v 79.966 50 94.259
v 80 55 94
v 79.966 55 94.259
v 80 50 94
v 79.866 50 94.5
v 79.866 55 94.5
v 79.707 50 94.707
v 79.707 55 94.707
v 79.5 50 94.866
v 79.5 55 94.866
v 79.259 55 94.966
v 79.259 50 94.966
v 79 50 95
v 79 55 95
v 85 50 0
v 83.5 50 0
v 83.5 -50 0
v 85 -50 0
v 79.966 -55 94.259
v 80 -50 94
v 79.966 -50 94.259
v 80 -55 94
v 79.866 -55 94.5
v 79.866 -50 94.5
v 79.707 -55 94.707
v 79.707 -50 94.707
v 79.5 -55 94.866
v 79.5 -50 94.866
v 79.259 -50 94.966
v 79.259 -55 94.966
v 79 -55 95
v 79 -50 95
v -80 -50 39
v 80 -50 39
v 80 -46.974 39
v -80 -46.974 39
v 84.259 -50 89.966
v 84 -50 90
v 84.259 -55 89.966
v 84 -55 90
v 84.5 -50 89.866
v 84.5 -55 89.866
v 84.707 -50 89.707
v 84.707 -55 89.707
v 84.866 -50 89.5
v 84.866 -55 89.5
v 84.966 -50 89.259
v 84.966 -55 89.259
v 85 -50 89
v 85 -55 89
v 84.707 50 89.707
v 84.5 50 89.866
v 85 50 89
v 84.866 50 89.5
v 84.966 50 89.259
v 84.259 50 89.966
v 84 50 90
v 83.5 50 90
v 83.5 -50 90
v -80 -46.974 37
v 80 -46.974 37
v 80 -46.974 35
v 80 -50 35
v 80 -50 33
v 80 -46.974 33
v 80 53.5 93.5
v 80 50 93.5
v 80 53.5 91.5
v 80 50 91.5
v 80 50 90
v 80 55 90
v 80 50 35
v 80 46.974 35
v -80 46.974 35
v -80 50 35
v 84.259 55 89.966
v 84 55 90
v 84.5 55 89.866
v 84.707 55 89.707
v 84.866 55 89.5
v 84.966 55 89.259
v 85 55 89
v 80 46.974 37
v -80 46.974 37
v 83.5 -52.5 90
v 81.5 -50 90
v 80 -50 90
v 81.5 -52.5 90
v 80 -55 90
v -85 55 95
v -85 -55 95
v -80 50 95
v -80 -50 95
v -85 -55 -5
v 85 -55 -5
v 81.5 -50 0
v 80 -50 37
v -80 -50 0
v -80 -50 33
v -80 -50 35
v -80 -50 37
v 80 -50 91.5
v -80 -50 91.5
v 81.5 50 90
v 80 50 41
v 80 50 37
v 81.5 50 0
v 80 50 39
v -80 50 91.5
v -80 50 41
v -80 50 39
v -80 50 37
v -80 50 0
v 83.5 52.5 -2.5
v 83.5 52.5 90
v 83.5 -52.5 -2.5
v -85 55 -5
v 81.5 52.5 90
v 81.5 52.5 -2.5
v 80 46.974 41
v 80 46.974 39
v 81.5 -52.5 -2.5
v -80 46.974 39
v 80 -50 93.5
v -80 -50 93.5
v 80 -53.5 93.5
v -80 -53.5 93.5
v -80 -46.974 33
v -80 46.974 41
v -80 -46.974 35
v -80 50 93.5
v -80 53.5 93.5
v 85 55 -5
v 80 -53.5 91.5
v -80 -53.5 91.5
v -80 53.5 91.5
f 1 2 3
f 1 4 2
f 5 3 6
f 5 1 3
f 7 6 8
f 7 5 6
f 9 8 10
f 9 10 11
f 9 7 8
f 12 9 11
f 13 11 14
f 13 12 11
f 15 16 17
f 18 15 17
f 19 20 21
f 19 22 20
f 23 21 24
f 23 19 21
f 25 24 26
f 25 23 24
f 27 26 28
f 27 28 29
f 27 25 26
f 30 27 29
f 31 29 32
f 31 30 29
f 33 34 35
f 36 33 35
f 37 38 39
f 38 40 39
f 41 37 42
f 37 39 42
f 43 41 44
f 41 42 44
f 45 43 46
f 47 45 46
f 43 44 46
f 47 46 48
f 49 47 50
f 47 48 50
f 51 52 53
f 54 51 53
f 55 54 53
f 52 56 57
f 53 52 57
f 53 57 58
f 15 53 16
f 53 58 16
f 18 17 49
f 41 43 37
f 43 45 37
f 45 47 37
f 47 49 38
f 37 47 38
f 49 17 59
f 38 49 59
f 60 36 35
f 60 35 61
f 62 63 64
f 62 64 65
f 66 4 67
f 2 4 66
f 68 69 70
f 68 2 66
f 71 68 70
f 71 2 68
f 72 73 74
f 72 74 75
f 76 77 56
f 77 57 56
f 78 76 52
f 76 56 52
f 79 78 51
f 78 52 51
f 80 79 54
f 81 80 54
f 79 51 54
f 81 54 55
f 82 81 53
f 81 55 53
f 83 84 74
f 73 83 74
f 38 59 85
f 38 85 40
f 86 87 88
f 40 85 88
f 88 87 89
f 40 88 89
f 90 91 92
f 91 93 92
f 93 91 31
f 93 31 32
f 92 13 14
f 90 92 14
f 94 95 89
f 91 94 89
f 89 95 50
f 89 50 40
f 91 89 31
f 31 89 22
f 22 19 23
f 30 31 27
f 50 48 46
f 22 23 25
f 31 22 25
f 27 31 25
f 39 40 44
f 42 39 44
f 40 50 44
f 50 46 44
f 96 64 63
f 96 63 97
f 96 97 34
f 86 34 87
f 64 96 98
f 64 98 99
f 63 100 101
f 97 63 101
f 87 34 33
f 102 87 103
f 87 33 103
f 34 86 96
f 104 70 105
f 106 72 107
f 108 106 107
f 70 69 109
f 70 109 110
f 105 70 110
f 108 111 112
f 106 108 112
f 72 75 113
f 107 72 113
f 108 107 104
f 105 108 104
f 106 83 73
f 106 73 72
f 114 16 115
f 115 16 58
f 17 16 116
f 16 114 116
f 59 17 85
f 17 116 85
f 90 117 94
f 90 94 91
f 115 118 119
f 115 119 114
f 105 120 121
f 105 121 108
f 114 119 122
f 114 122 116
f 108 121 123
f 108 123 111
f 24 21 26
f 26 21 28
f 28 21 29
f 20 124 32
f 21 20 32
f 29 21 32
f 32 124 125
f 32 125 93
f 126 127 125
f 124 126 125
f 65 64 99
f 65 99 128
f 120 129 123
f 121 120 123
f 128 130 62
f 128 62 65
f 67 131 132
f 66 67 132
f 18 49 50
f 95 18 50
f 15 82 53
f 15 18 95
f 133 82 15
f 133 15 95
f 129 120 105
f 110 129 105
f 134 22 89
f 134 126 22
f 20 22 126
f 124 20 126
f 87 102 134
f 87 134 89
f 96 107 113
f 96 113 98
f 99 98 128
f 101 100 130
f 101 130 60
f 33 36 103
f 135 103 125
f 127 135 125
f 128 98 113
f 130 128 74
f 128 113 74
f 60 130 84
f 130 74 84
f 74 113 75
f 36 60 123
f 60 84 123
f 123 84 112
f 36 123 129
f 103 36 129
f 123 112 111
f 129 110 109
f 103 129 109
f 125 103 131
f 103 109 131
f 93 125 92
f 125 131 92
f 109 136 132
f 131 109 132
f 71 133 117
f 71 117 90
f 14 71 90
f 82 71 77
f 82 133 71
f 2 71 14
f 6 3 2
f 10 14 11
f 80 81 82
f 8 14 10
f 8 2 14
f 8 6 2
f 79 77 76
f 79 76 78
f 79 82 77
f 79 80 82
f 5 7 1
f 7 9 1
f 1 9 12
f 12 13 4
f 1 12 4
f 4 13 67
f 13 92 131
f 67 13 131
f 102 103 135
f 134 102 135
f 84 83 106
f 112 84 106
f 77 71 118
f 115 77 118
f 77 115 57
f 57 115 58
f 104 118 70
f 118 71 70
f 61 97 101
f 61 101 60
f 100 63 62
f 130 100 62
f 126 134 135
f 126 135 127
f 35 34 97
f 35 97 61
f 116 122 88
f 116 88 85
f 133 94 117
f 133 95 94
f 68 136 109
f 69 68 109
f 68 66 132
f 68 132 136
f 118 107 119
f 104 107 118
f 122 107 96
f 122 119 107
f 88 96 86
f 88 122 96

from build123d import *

# Parameters (mm, degrees)
BOSS_EXTRUDE1_DEPTH   = 90
BOSS_EXTRUDE1_2_DEPTH = 90
SKETCH3_W             = 2
SKETCH3_H             = 3.026273801
EXTRUDE_THIN1_DEPTH   = 160
SKETCH5_W             = 160
SKETCH5_H             = 110
BOSS_EXTRUDE2_DEPTH   = 5
BOSS_EXTRUDE3_DEPTH   = 5
SKETCH7_W             = 2
SKETCH7_H             = 100
CUT_EXTRUDE1_DEPTH    = 2.5
SKETCH8_W             = 2
SKETCH8_H             = 90
CUT_EXTRUDE2_DEPTH    = 2.5
SKETCH9_W             = 2
SKETCH9_H             = 90
CUT_EXTRUDE3_DEPTH    = 2.5
SKETCH10_W            = 2
SKETCH10_H            = 2.5
CUT_EXTRUDE4_DEPTH    = 2.5
BOSS_EXTRUDE4_DEPTH   = 160
SKETCH12_W            = 100
SKETCH12_H            = 110
BOSS_EXTRUDE5_DEPTH   = 5
FILLET1_R             = 1


with BuildPart() as part:
    # Sketch2 → Boss-Extrude1 (new body)
    with BuildSketch(Plane.XY):
        Polygon((80, 55), (-80, 55), (-80, 50), (-75, 50), (75, 50), (80, 50), align=None)
    extrude(amount=BOSS_EXTRUDE1_DEPTH)



with BuildPart() as body_2:
    # Sketch2 → Boss-Extrude1 2 (new body)
    with BuildSketch(Plane.XY):
        Polygon((-75, -50), (-80, -50), (-80, -55), (80, -55), (80, -50), (75, -50), align=None)
    extrude(amount=BOSS_EXTRUDE1_2_DEPTH)


with BuildPart() as part_1:
    add(part.part)

    add(body_2.part)  # Extrude-Thin1 merges body 2
    # Sketch3 → Extrude-Thin1 (add)
    with BuildSketch(Plane(origin=(80, 0, 0), x_dir=(0, 0, -1), z_dir=(1, 0, 0))):
        with Locations((-36, 48.486863099)):
            Rectangle(SKETCH3_W, SKETCH3_H)
        with Locations((-34, -48.486863099)):
            Rectangle(SKETCH3_W, SKETCH3_H)
        with Locations((-40, 48.486863099)):
            Rectangle(SKETCH3_W, SKETCH3_H)
        with Locations((-38, -48.486863099)):
            Rectangle(SKETCH3_W, SKETCH3_H)
    extrude(amount=-EXTRUDE_THIN1_DEPTH)

    # Sketch5 → Boss-Extrude2 (add)
    with BuildSketch(Plane(origin=(0, 0, 0), x_dir=(-1, 0, 0), z_dir=(0, 0, -1))):
        Rectangle(SKETCH5_W, SKETCH5_H)
    extrude(amount=BOSS_EXTRUDE2_DEPTH)

    # Sketch6 → Boss-Extrude3 (add)
    with BuildSketch(Plane(origin=(80, 0, 0), x_dir=(0, 0, -1), z_dir=(1, 0, 0))):
        Polygon((-90, 55), (-90, 50), (0, 50), (0, -50), (-90, -50), (-90, -55), (5, -55), (5, 55), align=None)
    extrude(amount=BOSS_EXTRUDE3_DEPTH)

    # Sketch7 → Cut-Extrude1 (cut)
    with BuildSketch(Plane.XY):
        with Locations((82.5, 0)):
            Rectangle(SKETCH7_W, SKETCH7_H)
    extrude(amount=-CUT_EXTRUDE1_DEPTH, mode=Mode.SUBTRACT)

    # Sketch8 → Cut-Extrude2 (cut)
    with BuildSketch(Plane.XZ.offset(-50)):
        with Locations((82.5, 45)):
            Rectangle(SKETCH8_W, SKETCH8_H)
    extrude(amount=-CUT_EXTRUDE2_DEPTH, mode=Mode.SUBTRACT)

    # Sketch9 → Cut-Extrude3 (cut)
    with BuildSketch(Plane(origin=(0, -50, 0), x_dir=(1, 0, 0), z_dir=(0, 1, 0))):
        with Locations((82.5, -45)):
            Rectangle(SKETCH9_W, SKETCH9_H)
    extrude(amount=-CUT_EXTRUDE3_DEPTH, mode=Mode.SUBTRACT)

    # Sketch10 → Cut-Extrude4 (cut)
    with BuildSketch(Plane.XY):
        with Locations((82.5, 51.25)):
            Rectangle(SKETCH10_W, SKETCH10_H)
        with Locations((82.5, -51.25)):
            Rectangle(SKETCH10_W, SKETCH10_H)
    extrude(amount=-CUT_EXTRUDE4_DEPTH, mode=Mode.SUBTRACT)

    # Sketch11 → Boss-Extrude4 (add)
    with BuildSketch(Plane.ZY.offset(80)):
        Polygon((90, 50), (90, 55), (95, 55), (95, 50), (93.5, 50), (93.5, 53.5), (91.5, 53.5), (91.5, 50), align=None)
        Polygon((91.5, -53.5), (93.5, -53.5), (93.5, -50), (95, -50), (95, -55), (90, -55), (90, -50), (91.5, -50), align=None)
    extrude(amount=-BOSS_EXTRUDE4_DEPTH)

    # Sketch12 → Boss-Extrude5 (add)
    with BuildSketch(Plane.ZY.offset(80)):
        with Locations((45, 0)):
            Rectangle(SKETCH12_W, SKETCH12_H)
    extrude(amount=BOSS_EXTRUDE5_DEPTH)

    # Fillet1
    fillet1_edges = [part_1.edges().sort_by_distance(p)[0] for p in [
        (80, 52.5, 95),
        (80, -52.5, 95),
        (85, 52.5, 90),
        (85, -52.5, 90),
    ]]
    fillet(fillet1_edges, radius=FILLET1_R)


solid = part_1.part
